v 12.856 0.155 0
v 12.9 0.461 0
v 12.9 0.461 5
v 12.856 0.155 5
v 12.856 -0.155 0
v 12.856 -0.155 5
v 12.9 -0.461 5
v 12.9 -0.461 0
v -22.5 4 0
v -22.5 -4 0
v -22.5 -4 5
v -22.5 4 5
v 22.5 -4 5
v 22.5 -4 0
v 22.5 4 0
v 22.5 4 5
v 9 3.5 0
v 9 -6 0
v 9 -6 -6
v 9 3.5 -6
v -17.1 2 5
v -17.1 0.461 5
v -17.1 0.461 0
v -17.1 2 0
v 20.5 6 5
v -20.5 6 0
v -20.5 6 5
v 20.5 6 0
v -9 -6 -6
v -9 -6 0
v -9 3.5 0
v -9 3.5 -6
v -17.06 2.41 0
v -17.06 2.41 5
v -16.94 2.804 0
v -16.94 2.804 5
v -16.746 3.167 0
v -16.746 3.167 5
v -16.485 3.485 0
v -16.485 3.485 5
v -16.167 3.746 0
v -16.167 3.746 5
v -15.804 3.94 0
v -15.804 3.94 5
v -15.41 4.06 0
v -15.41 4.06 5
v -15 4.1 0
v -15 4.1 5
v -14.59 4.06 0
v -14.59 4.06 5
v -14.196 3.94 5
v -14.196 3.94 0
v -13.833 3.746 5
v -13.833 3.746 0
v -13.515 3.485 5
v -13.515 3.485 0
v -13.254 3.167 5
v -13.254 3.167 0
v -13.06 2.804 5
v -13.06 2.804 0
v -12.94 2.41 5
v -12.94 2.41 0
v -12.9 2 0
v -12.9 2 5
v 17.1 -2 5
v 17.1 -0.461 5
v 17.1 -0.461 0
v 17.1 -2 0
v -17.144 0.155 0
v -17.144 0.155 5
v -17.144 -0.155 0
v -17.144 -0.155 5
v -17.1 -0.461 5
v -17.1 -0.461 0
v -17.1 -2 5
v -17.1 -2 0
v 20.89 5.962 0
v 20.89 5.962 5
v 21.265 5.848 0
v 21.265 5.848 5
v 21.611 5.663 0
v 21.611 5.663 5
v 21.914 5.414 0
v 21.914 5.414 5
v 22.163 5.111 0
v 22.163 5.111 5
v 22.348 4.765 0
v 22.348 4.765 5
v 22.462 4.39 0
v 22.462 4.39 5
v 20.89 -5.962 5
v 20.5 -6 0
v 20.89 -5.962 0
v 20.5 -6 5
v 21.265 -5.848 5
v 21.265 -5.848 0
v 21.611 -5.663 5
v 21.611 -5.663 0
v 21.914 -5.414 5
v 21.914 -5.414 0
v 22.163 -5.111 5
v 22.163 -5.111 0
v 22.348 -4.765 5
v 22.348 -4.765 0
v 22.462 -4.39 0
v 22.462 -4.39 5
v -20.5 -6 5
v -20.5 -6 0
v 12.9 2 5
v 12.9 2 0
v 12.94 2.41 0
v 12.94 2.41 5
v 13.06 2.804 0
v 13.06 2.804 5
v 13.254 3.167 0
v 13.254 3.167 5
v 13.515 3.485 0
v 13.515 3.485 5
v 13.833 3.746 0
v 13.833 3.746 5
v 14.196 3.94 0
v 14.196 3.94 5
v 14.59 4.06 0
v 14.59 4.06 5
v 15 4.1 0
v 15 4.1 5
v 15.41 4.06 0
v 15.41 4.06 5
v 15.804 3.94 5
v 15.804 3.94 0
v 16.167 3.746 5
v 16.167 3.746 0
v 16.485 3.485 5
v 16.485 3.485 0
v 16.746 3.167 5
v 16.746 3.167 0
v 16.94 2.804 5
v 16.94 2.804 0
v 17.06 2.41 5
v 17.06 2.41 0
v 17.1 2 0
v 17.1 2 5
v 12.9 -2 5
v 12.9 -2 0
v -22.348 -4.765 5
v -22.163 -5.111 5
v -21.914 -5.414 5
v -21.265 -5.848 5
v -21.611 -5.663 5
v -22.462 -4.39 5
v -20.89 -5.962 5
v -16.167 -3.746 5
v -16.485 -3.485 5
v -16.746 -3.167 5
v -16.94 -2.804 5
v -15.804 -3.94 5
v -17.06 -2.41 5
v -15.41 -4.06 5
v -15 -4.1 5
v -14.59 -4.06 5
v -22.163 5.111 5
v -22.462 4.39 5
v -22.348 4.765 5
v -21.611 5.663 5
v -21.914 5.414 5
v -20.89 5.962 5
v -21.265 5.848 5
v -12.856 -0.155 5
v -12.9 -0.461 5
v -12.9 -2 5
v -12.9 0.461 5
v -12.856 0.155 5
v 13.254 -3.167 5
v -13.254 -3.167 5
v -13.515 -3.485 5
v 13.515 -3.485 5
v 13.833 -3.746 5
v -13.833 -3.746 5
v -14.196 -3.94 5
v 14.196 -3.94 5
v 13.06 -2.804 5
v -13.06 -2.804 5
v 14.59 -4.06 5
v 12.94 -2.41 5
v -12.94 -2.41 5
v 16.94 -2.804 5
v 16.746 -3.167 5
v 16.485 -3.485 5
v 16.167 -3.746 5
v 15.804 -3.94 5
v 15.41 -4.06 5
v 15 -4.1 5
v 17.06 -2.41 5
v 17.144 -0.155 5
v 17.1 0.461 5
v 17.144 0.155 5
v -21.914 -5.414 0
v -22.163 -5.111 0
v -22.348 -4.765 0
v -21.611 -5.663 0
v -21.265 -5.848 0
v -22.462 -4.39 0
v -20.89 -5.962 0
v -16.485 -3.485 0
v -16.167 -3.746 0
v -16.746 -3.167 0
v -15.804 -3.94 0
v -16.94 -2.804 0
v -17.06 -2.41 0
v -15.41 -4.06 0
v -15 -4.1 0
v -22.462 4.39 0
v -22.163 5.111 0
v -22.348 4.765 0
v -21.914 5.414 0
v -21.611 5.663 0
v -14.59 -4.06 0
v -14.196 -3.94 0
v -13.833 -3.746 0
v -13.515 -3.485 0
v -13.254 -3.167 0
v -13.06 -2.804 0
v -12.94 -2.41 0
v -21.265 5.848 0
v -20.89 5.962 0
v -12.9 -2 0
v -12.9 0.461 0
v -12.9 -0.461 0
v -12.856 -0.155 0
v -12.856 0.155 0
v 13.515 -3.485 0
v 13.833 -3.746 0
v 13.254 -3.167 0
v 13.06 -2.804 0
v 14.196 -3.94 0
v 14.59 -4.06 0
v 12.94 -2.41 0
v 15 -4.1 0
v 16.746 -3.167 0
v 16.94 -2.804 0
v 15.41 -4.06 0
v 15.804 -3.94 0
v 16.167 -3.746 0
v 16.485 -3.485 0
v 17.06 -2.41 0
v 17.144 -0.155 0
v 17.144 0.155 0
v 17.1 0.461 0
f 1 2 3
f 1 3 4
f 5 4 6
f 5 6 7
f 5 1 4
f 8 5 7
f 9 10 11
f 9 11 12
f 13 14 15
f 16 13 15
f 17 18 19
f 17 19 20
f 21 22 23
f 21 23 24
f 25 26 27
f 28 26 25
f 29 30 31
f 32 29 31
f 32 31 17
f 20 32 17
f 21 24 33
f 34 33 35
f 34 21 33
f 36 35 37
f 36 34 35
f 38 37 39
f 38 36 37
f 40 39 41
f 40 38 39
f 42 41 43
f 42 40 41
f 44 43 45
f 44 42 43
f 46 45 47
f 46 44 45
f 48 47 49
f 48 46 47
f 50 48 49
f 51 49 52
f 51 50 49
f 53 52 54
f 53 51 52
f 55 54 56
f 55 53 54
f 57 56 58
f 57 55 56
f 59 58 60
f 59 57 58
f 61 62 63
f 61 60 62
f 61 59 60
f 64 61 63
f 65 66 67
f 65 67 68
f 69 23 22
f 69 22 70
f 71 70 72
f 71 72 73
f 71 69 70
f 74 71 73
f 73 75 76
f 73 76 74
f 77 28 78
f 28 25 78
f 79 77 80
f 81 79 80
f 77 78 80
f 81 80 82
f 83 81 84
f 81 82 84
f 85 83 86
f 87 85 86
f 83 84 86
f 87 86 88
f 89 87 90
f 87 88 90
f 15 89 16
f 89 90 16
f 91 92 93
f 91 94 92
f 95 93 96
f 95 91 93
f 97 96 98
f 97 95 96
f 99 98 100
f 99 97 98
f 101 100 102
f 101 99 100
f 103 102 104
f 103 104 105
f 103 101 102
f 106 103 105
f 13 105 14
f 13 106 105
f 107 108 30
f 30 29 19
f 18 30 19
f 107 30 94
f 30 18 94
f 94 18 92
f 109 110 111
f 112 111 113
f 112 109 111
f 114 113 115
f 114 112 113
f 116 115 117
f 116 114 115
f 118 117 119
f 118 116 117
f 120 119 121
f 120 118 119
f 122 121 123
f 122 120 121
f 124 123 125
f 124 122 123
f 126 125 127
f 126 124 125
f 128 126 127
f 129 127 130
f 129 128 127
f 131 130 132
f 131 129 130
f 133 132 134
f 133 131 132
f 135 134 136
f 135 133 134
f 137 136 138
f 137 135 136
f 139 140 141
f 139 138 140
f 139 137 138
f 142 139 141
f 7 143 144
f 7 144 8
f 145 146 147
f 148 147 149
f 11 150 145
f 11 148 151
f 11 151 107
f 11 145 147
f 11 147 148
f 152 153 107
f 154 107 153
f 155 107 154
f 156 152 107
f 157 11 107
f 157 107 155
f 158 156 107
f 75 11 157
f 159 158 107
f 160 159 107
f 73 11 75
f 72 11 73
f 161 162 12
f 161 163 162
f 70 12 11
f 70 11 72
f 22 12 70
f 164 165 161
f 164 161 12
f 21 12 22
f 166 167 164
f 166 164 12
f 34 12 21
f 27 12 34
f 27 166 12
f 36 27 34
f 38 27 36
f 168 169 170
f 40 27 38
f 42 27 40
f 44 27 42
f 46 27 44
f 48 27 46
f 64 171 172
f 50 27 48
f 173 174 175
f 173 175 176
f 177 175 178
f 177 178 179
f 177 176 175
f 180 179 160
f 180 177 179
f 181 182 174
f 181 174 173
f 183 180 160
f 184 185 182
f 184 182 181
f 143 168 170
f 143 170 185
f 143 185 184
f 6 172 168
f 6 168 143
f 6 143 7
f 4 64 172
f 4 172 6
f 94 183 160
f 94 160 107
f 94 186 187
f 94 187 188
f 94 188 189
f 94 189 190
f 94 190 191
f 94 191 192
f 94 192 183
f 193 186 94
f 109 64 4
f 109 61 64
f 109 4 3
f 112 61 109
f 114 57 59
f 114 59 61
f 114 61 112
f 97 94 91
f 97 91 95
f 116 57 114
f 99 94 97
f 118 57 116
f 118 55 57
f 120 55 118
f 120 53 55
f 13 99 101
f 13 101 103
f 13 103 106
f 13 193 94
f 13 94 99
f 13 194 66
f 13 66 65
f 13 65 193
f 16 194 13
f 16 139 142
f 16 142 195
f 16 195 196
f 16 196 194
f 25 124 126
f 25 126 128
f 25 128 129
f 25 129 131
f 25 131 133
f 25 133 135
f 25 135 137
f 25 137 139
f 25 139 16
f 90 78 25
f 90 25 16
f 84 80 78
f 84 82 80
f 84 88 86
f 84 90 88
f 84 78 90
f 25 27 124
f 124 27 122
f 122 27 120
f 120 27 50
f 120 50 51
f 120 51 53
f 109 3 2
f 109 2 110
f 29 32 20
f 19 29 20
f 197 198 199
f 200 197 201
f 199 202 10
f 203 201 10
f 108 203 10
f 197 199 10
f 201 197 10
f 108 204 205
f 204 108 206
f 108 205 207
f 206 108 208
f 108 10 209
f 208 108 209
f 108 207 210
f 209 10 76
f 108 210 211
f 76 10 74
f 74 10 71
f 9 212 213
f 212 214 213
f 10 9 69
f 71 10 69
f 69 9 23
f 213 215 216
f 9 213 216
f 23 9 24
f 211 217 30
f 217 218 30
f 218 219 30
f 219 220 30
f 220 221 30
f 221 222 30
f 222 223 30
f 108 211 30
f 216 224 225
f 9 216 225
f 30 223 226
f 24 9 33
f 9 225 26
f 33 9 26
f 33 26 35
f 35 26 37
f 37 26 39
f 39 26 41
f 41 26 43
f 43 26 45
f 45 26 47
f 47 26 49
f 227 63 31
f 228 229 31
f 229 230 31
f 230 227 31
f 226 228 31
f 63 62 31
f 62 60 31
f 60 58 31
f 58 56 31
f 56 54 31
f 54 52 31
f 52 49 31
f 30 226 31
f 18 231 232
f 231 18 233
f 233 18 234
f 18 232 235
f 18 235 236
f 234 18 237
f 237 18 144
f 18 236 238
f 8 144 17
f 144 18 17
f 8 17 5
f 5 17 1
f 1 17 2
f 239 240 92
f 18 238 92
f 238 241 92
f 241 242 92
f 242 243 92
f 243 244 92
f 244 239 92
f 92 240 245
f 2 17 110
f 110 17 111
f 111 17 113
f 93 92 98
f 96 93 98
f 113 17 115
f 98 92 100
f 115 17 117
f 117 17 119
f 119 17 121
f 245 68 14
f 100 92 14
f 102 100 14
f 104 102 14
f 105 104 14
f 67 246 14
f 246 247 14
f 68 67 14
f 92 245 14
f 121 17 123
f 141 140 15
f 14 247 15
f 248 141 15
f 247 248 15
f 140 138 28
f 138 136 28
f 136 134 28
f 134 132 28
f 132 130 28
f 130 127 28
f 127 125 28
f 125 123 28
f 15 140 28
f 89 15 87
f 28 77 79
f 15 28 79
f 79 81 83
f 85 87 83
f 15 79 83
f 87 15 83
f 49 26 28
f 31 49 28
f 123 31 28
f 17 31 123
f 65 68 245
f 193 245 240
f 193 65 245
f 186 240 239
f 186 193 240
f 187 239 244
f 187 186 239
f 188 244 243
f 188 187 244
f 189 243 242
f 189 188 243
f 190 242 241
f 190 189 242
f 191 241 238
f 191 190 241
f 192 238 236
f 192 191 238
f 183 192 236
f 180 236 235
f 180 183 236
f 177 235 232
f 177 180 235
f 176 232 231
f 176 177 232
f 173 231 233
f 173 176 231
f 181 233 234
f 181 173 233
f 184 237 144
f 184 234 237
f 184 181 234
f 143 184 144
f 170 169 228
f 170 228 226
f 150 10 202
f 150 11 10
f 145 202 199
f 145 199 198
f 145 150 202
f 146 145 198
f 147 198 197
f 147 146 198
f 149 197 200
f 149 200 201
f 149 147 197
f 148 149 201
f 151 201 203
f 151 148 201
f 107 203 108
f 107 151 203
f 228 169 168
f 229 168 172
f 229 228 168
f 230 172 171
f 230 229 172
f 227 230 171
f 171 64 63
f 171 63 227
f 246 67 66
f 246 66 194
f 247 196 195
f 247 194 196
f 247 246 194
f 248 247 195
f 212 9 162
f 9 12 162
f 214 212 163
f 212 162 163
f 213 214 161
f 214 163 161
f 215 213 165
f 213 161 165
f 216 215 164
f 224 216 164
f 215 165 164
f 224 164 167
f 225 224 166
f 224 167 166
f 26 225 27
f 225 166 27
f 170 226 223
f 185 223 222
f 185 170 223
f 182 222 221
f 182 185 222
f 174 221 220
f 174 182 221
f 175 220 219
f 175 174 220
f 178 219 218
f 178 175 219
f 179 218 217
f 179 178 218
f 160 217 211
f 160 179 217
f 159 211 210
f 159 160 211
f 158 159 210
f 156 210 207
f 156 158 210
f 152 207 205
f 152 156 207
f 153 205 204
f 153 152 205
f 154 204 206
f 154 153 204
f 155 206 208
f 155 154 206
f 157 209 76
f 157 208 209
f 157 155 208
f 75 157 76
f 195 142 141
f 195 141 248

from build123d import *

# Parameters (mm, degrees)
SKETCH1_W           = 45
SKETCH1_H           = 12
SKETCH1_R           = 2.15
BOSS_EXTRUDE1_DEPTH = 5
CUT_EXTRUDE1_DEPTH  = 24.817010728
SKETCH3_W           = 18
SKETCH3_H           = 9.5
BOSS_EXTRUDE2_DEPTH = 6
FILLET1_R           = 2


with BuildPart() as part:
    # Sketch1 → Boss-Extrude1 (new body)
    with BuildSketch(Plane.XY):
        Rectangle(SKETCH1_W, SKETCH1_H)
        with Locations((-15, 0)):
            Circle(SKETCH1_R, mode=Mode.SUBTRACT)
        with Locations((15, 0)):
            Circle(SKETCH1_R, mode=Mode.SUBTRACT)
    extrude(amount=BOSS_EXTRUDE1_DEPTH)

    # Sketch2 → Cut-Extrude1 (cut, through all)
    with BuildSketch(Plane.XY.offset(5)):
        with BuildLine():
            Line((-12.9, 2), (-12.9, -2))
            ThreePointArc((-12.9, -2), (-15, -4.1), (-17.1, -2))
            Line((-17.1, -2), (-17.1, 2))
            ThreePointArc((-17.1, 2), (-15, 4.1), (-12.9, 2))
        make_face()
        with BuildLine():
            Line((12.9, -2), (12.9, 2))
            ThreePointArc((12.9, 2), (15, 4.1), (17.1, 2))
            Line((17.1, 2), (17.1, -2))
            ThreePointArc((17.1, -2), (15, -4.1), (12.9, -2))
        make_face()
    extrude(amount=-CUT_EXTRUDE1_DEPTH, mode=Mode.SUBTRACT)

    # Sketch3 → Boss-Extrude2 (add)
    with BuildSketch(Plane.XY):
        with Locations((0, -1.25)):
            Rectangle(SKETCH3_W, SKETCH3_H)
    extrude(amount=-BOSS_EXTRUDE2_DEPTH)

    # Fillet1
    fillet1_edges = [part.edges().sort_by_distance(p)[0] for p in [
        (-22.5, 6, 2.5),
        (-22.5, -6, 2.5),
        (22.5, -6, 2.5),
        (22.5, 6, 2.5),
    ]]
    fillet(fillet1_edges, radius=FILLET1_R)


solid = part.part
